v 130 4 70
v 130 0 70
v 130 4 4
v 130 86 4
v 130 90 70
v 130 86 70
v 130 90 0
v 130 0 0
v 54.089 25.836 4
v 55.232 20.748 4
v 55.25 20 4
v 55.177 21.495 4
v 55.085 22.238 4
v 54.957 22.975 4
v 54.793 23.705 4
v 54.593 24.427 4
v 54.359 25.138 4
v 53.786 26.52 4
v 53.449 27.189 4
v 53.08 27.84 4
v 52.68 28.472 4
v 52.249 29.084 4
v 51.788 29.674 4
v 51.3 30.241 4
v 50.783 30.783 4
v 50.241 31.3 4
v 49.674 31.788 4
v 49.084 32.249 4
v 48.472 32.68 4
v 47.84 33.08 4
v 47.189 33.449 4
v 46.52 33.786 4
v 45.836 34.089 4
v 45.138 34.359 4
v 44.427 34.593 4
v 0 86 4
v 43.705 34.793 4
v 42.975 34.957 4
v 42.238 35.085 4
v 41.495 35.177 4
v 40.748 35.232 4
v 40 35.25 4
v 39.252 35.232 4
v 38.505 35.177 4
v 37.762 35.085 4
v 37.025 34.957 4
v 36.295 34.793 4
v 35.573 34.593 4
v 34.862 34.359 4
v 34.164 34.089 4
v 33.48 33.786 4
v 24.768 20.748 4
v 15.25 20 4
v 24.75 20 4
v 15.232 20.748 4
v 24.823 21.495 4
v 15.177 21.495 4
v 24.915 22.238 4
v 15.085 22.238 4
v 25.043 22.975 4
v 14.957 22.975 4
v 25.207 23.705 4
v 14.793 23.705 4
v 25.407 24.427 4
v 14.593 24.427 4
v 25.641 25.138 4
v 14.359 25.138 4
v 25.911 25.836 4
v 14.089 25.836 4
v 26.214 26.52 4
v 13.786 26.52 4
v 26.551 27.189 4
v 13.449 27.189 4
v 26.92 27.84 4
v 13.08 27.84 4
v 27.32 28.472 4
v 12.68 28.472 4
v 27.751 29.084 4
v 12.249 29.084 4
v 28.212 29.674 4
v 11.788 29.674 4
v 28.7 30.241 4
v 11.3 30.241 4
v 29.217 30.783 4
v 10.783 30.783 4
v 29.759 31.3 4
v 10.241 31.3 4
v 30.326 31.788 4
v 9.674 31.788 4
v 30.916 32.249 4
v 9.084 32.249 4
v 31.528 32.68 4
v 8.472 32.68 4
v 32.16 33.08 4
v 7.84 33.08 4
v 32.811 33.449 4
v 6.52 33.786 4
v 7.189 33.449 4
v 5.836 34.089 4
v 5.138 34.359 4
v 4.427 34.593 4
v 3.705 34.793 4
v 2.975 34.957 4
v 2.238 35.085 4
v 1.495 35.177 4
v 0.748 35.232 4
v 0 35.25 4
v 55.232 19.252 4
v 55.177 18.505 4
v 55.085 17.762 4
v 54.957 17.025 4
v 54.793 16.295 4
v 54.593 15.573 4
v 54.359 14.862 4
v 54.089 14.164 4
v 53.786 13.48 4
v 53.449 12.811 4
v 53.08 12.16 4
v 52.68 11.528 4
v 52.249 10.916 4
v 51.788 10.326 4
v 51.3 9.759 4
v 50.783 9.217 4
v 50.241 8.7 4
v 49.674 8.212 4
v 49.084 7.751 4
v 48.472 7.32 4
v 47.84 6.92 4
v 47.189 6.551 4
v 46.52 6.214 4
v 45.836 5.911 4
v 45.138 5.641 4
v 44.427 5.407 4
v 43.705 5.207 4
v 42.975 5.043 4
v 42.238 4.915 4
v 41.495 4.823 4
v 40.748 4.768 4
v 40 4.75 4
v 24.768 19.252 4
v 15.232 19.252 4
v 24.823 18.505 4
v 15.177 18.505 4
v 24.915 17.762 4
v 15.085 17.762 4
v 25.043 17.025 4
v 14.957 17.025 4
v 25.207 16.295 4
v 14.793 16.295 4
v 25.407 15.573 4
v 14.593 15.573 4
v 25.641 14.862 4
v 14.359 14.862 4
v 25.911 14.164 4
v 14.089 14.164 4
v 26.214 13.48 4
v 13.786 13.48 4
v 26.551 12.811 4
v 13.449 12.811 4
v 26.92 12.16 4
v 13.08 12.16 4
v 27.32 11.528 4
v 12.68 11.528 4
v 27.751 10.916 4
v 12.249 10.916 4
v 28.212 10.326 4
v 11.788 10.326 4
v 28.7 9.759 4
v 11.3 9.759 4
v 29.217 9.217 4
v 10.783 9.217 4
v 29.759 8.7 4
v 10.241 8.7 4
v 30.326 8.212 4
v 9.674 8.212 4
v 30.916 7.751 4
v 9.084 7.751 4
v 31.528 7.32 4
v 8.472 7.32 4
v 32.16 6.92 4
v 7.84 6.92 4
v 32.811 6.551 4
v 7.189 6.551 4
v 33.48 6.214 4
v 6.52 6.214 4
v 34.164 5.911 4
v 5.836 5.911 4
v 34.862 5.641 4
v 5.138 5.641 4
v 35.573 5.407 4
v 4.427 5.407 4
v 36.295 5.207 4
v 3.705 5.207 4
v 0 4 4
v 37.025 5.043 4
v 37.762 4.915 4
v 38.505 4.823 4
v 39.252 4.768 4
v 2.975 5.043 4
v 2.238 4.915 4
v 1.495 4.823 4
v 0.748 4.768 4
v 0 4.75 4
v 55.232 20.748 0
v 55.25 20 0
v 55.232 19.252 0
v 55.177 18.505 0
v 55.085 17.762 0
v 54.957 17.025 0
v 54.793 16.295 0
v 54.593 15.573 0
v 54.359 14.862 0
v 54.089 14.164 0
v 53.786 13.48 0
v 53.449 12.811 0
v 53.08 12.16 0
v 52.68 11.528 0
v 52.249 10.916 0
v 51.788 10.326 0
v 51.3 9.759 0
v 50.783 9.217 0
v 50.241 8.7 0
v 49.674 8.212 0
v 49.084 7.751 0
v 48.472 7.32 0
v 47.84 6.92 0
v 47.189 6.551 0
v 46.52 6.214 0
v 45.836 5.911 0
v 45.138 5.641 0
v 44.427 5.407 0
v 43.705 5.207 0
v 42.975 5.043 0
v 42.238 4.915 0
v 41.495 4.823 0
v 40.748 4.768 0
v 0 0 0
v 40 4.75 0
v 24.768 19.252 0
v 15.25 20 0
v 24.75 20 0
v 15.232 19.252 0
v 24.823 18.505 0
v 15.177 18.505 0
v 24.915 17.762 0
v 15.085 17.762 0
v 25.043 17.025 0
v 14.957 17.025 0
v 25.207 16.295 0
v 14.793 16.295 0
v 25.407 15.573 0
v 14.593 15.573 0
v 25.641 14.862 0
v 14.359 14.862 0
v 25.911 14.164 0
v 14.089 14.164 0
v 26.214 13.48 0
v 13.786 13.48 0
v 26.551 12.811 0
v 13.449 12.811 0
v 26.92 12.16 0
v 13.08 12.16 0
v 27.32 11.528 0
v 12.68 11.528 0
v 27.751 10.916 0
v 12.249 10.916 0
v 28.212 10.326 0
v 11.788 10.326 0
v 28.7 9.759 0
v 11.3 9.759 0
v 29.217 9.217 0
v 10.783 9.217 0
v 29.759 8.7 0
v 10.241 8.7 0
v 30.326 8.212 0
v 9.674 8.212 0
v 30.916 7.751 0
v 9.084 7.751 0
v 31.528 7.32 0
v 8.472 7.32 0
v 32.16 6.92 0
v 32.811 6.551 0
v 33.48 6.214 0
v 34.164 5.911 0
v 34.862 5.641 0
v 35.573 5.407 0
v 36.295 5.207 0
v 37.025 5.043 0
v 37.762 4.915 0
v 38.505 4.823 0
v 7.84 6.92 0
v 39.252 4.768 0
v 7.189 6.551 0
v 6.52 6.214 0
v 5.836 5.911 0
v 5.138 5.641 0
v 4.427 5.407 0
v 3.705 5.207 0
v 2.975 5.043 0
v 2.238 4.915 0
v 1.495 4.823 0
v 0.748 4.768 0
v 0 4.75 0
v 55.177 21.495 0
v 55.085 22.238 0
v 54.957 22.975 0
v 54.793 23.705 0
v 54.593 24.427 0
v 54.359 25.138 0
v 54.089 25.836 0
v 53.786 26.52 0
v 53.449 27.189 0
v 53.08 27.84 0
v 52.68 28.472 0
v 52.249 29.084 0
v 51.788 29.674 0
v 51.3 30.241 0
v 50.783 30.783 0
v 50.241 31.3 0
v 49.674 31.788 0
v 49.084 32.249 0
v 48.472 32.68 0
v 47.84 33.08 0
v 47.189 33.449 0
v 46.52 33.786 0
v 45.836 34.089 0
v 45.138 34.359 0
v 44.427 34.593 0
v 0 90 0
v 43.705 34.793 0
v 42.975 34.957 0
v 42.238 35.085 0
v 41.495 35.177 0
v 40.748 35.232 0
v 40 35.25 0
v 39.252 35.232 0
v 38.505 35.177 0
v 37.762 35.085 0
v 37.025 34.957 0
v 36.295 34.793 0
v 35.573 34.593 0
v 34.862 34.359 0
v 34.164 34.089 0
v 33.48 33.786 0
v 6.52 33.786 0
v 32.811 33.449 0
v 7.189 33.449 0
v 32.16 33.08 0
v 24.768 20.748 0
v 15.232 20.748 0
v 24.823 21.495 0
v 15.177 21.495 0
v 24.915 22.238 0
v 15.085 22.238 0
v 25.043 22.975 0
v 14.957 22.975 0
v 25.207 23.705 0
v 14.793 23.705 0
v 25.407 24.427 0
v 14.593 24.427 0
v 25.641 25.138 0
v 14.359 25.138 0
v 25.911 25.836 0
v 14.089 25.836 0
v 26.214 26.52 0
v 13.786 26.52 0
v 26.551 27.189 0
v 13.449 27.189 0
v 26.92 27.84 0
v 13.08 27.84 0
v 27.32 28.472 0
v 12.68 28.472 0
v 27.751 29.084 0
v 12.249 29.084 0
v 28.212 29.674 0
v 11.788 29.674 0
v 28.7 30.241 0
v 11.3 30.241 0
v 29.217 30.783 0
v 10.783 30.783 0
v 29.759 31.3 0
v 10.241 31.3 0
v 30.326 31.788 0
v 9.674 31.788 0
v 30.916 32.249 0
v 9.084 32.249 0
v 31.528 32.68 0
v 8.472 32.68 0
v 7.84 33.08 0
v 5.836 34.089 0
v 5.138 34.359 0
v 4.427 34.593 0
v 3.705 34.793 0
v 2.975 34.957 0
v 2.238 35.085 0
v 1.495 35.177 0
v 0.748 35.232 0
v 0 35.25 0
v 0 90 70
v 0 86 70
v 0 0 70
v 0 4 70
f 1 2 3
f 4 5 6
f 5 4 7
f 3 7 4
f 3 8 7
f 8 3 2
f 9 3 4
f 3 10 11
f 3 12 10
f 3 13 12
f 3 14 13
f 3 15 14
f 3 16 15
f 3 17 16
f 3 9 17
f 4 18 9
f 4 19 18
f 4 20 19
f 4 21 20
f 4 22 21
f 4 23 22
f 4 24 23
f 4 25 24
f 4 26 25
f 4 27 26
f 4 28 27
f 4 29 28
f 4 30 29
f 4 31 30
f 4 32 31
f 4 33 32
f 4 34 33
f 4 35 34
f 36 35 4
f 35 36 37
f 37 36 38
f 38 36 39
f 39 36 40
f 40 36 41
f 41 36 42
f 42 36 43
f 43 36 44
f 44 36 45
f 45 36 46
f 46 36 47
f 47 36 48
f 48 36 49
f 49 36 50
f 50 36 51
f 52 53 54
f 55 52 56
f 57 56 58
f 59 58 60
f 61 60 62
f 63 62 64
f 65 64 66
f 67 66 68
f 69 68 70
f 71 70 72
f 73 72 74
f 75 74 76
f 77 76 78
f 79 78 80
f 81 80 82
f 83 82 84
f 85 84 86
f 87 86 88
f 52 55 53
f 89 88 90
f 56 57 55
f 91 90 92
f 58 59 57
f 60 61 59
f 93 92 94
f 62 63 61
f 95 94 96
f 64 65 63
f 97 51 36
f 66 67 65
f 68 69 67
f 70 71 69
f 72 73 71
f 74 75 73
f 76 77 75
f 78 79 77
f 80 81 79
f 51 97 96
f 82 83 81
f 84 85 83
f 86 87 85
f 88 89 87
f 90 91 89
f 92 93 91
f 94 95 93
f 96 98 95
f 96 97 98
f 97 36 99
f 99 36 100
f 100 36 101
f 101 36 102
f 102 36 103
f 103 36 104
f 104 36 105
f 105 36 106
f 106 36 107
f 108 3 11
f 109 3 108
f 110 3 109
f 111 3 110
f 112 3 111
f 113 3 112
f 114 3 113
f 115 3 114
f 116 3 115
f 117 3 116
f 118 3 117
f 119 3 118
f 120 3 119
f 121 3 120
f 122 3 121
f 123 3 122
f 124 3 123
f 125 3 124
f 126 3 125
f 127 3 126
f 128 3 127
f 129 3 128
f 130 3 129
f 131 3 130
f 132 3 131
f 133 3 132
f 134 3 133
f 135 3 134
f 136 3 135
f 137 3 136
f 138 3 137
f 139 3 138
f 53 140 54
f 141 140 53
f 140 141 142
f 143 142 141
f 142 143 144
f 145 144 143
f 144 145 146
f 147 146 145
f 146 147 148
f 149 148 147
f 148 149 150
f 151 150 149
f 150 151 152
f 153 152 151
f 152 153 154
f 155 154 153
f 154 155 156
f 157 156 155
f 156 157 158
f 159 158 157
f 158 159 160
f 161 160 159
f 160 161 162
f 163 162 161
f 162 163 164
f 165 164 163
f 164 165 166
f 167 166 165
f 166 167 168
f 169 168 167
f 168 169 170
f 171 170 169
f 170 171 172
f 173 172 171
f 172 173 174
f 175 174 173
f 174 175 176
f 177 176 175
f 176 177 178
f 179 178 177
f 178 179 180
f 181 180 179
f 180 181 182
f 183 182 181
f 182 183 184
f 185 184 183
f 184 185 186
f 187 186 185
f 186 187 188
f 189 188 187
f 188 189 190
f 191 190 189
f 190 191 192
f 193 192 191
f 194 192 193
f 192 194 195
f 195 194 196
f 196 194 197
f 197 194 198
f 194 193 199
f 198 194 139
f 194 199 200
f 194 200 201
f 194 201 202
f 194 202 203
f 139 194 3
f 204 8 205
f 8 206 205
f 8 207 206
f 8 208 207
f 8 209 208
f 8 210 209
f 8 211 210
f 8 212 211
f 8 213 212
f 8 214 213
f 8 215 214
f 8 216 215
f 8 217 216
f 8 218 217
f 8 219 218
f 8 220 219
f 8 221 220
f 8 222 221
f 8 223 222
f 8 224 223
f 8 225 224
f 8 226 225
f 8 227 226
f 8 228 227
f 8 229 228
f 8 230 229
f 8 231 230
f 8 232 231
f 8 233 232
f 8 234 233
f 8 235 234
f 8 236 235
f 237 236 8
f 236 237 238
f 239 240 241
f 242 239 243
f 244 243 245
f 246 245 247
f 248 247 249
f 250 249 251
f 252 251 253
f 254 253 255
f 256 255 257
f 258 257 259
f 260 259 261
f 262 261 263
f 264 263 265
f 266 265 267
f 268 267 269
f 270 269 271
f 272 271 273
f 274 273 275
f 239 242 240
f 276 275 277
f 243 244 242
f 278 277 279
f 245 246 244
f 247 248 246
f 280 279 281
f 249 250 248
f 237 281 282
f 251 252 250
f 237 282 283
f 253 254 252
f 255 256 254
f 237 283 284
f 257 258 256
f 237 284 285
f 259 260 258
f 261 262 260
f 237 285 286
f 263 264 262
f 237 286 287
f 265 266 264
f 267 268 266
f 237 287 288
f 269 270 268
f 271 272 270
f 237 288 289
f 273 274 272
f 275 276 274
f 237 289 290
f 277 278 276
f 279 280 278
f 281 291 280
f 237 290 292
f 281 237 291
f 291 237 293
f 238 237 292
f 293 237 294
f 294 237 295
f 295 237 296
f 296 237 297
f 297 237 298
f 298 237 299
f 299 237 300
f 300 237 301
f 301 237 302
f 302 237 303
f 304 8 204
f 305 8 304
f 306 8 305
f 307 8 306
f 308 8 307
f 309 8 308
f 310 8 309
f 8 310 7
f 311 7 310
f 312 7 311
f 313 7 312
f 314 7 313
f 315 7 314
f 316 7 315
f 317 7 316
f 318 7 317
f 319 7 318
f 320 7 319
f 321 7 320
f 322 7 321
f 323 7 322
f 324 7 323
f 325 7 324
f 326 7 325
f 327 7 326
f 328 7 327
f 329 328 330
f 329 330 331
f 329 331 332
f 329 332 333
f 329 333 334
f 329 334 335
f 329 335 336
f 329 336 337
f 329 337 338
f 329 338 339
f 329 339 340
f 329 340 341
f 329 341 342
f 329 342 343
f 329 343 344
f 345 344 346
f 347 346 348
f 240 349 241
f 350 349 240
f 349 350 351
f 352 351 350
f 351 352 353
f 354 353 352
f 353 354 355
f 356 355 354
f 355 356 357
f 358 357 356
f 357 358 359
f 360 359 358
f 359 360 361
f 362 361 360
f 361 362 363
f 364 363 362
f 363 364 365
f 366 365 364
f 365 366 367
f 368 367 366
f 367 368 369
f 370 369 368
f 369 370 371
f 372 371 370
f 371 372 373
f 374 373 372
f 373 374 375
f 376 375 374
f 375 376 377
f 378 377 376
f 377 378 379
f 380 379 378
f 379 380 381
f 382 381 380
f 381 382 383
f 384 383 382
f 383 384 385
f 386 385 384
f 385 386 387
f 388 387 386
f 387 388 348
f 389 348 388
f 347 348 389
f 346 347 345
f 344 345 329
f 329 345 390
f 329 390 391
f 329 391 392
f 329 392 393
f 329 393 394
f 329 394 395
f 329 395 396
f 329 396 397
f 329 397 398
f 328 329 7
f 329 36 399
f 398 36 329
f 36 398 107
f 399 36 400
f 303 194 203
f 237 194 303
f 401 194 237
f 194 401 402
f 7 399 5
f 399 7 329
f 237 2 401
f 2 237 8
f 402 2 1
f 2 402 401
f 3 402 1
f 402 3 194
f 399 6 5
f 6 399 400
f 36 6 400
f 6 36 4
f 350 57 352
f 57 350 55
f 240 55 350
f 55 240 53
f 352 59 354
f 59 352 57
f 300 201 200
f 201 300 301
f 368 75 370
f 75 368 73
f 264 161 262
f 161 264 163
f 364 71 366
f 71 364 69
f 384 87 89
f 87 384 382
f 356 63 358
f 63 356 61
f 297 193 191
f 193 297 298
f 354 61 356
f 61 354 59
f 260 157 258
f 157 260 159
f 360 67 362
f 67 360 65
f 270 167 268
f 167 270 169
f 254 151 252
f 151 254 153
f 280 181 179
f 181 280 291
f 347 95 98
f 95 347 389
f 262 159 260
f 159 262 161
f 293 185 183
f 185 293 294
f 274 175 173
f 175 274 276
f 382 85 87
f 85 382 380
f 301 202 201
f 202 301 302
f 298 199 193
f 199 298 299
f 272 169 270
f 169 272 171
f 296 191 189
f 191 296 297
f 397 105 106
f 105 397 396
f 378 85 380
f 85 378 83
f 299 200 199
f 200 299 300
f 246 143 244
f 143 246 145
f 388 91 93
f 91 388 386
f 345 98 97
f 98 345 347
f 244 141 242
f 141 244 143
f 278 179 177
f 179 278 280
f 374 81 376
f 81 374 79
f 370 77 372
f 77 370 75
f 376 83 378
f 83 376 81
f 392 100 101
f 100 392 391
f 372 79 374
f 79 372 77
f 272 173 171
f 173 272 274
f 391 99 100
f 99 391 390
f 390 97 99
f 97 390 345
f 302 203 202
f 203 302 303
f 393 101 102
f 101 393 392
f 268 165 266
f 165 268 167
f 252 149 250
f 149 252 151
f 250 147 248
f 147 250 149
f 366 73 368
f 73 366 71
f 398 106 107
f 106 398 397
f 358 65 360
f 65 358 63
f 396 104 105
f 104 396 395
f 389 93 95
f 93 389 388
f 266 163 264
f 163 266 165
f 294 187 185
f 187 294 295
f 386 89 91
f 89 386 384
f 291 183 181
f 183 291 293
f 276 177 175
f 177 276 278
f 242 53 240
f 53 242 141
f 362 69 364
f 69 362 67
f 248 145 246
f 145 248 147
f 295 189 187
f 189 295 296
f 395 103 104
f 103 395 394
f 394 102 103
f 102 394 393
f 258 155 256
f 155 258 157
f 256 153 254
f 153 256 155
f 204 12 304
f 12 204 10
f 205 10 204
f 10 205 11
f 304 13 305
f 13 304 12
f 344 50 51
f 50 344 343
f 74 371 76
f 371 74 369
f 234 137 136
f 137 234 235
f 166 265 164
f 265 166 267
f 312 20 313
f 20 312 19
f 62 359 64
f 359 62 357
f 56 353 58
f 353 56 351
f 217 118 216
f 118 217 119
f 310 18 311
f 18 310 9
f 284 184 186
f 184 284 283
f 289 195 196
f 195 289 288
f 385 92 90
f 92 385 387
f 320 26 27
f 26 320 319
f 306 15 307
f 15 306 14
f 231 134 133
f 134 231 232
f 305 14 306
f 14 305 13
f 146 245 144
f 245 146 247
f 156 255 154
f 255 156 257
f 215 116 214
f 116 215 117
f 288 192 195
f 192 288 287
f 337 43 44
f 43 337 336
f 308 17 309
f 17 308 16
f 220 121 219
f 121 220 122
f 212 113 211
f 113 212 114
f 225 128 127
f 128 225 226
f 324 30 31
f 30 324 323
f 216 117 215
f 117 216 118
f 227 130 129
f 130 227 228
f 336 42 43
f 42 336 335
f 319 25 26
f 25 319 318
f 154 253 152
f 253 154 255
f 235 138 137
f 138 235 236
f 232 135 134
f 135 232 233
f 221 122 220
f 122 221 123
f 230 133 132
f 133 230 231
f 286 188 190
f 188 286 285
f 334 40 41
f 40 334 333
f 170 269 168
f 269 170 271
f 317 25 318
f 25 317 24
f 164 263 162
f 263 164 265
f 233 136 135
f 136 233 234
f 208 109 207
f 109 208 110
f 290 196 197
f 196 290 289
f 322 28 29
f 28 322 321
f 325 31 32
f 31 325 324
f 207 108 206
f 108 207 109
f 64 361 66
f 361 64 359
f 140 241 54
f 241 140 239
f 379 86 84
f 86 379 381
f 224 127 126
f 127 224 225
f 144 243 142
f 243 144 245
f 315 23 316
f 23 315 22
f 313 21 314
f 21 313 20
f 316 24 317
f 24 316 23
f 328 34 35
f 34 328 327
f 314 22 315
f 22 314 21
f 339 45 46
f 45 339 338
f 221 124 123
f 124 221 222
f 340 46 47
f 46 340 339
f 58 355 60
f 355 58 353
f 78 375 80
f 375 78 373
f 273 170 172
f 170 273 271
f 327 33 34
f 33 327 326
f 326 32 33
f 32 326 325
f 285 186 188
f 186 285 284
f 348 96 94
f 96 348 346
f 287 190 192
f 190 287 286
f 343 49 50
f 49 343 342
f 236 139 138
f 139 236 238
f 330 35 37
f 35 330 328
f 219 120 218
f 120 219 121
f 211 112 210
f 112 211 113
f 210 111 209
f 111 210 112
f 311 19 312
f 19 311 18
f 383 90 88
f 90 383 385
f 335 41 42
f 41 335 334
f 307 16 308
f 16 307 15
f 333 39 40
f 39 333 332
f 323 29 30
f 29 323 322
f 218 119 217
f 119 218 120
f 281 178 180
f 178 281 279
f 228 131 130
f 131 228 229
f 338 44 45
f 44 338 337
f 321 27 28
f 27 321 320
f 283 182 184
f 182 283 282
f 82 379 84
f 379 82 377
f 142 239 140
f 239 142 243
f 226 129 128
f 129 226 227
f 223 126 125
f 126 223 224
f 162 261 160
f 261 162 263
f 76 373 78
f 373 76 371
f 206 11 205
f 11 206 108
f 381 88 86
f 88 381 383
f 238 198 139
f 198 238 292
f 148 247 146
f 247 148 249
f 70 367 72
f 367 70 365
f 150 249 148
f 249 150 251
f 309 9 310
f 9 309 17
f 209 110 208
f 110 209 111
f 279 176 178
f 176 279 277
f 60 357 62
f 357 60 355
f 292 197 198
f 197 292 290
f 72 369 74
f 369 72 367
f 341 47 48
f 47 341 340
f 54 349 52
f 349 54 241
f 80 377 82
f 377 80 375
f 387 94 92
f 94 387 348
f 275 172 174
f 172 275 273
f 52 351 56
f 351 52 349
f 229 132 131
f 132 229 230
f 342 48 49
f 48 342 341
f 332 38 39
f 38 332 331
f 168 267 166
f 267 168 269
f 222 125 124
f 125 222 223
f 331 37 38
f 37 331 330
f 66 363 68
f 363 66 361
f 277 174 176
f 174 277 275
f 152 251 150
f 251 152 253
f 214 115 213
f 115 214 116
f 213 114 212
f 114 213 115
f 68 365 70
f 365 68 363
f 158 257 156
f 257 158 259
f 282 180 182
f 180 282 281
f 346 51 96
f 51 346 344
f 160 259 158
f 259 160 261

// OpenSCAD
// Rack for six 50 mL conical (Falcon-type) tubes
// Print orientation: Upside down. Flat plate on bed (Z=0).
// After printing, flip over so walls stand on bed and tubes hang down.

// --- Dimensions ---
// Plate size
$plate_x = 130; // mm
$plate_y = 90;  // mm
$plate_z = 4;   // mm

// Hole specifications
$hole_diameter = 30.5; // mm
$hole_count = 6;
$hole_rows = 2;
$hole_cols = 3;
$hole_spacing_x = 40; // mm centre-to-centre
$hole_spacing_y = 40; // mm centre-to-centre

// Wall specifications
$wall_length = 130; // mm (along X)
$wall_thickness = 4; // mm (along Y)
$wall_height = 70;  // mm (rise from plate to z = 70)

// --- Configuration ---
$fn = 128; // High resolution for smooth tube holes

// --- Helper: Generate hole positions ---
// We need 2 rows along Y and 3 columns along X.
// Total span X = 2 * spacing_x = 80. Center offset = 40.
// Total span Y = 1 * spacing_y = 40. Center offset = 20.
// Positions relative to plate center (0,0):
// Row 1 (Y = -20): X = -40, 0, 40
// Row 2 (Y = +20): X = -40, 0, 40

$hole_positions = [
    [-40, -20], [0, -20], [40, -20],
    [-40, 20], [0, 20], [40, 20]
];

// --- Main Module ---
module tube_rack() {
    // 1. The Base Plate
    // Lies on Z=0, extends to Z=$plate_z
    difference() {
        union() {
            // Base Plate
            cube([
                $plate_x, 
                $plate_y, 
                $plate_z
            ]);

            // 2. The Two Side Walls
            // They run along the long edges (X axis).
            // Left Wall: Y = 0 to $wall_thickness
            // Right Wall: Y = $plate_y - $wall_thickness to $plate_y
            // Both rise from Z=0 to Z=$wall_height
            
            // Left Wall
            translate([0, 0, 0]) 
                cube([
                    $wall_length, 
                    $wall_thickness, 
                    $wall_height
                ]);

            // Right Wall
            translate([0, $plate_y - $wall_thickness, 0]) 
                cube([
                    $wall_length, 
                    $wall_thickness, 
                    $wall_height
                ]);
        }

        // 3. Cut the Holes
        // Extend slightly past the plate thickness to ensure clean cut
        $cut_depth = $plate_z + 0.5; 
        
        for (p = $hole_positions) {
            translate(p)
                cylinder(
                    h = $cut_depth,
                    d = $hole_diameter,
                    $fn = $fn
                );
        }
    }
}

// Generate the part
tube_rack();
